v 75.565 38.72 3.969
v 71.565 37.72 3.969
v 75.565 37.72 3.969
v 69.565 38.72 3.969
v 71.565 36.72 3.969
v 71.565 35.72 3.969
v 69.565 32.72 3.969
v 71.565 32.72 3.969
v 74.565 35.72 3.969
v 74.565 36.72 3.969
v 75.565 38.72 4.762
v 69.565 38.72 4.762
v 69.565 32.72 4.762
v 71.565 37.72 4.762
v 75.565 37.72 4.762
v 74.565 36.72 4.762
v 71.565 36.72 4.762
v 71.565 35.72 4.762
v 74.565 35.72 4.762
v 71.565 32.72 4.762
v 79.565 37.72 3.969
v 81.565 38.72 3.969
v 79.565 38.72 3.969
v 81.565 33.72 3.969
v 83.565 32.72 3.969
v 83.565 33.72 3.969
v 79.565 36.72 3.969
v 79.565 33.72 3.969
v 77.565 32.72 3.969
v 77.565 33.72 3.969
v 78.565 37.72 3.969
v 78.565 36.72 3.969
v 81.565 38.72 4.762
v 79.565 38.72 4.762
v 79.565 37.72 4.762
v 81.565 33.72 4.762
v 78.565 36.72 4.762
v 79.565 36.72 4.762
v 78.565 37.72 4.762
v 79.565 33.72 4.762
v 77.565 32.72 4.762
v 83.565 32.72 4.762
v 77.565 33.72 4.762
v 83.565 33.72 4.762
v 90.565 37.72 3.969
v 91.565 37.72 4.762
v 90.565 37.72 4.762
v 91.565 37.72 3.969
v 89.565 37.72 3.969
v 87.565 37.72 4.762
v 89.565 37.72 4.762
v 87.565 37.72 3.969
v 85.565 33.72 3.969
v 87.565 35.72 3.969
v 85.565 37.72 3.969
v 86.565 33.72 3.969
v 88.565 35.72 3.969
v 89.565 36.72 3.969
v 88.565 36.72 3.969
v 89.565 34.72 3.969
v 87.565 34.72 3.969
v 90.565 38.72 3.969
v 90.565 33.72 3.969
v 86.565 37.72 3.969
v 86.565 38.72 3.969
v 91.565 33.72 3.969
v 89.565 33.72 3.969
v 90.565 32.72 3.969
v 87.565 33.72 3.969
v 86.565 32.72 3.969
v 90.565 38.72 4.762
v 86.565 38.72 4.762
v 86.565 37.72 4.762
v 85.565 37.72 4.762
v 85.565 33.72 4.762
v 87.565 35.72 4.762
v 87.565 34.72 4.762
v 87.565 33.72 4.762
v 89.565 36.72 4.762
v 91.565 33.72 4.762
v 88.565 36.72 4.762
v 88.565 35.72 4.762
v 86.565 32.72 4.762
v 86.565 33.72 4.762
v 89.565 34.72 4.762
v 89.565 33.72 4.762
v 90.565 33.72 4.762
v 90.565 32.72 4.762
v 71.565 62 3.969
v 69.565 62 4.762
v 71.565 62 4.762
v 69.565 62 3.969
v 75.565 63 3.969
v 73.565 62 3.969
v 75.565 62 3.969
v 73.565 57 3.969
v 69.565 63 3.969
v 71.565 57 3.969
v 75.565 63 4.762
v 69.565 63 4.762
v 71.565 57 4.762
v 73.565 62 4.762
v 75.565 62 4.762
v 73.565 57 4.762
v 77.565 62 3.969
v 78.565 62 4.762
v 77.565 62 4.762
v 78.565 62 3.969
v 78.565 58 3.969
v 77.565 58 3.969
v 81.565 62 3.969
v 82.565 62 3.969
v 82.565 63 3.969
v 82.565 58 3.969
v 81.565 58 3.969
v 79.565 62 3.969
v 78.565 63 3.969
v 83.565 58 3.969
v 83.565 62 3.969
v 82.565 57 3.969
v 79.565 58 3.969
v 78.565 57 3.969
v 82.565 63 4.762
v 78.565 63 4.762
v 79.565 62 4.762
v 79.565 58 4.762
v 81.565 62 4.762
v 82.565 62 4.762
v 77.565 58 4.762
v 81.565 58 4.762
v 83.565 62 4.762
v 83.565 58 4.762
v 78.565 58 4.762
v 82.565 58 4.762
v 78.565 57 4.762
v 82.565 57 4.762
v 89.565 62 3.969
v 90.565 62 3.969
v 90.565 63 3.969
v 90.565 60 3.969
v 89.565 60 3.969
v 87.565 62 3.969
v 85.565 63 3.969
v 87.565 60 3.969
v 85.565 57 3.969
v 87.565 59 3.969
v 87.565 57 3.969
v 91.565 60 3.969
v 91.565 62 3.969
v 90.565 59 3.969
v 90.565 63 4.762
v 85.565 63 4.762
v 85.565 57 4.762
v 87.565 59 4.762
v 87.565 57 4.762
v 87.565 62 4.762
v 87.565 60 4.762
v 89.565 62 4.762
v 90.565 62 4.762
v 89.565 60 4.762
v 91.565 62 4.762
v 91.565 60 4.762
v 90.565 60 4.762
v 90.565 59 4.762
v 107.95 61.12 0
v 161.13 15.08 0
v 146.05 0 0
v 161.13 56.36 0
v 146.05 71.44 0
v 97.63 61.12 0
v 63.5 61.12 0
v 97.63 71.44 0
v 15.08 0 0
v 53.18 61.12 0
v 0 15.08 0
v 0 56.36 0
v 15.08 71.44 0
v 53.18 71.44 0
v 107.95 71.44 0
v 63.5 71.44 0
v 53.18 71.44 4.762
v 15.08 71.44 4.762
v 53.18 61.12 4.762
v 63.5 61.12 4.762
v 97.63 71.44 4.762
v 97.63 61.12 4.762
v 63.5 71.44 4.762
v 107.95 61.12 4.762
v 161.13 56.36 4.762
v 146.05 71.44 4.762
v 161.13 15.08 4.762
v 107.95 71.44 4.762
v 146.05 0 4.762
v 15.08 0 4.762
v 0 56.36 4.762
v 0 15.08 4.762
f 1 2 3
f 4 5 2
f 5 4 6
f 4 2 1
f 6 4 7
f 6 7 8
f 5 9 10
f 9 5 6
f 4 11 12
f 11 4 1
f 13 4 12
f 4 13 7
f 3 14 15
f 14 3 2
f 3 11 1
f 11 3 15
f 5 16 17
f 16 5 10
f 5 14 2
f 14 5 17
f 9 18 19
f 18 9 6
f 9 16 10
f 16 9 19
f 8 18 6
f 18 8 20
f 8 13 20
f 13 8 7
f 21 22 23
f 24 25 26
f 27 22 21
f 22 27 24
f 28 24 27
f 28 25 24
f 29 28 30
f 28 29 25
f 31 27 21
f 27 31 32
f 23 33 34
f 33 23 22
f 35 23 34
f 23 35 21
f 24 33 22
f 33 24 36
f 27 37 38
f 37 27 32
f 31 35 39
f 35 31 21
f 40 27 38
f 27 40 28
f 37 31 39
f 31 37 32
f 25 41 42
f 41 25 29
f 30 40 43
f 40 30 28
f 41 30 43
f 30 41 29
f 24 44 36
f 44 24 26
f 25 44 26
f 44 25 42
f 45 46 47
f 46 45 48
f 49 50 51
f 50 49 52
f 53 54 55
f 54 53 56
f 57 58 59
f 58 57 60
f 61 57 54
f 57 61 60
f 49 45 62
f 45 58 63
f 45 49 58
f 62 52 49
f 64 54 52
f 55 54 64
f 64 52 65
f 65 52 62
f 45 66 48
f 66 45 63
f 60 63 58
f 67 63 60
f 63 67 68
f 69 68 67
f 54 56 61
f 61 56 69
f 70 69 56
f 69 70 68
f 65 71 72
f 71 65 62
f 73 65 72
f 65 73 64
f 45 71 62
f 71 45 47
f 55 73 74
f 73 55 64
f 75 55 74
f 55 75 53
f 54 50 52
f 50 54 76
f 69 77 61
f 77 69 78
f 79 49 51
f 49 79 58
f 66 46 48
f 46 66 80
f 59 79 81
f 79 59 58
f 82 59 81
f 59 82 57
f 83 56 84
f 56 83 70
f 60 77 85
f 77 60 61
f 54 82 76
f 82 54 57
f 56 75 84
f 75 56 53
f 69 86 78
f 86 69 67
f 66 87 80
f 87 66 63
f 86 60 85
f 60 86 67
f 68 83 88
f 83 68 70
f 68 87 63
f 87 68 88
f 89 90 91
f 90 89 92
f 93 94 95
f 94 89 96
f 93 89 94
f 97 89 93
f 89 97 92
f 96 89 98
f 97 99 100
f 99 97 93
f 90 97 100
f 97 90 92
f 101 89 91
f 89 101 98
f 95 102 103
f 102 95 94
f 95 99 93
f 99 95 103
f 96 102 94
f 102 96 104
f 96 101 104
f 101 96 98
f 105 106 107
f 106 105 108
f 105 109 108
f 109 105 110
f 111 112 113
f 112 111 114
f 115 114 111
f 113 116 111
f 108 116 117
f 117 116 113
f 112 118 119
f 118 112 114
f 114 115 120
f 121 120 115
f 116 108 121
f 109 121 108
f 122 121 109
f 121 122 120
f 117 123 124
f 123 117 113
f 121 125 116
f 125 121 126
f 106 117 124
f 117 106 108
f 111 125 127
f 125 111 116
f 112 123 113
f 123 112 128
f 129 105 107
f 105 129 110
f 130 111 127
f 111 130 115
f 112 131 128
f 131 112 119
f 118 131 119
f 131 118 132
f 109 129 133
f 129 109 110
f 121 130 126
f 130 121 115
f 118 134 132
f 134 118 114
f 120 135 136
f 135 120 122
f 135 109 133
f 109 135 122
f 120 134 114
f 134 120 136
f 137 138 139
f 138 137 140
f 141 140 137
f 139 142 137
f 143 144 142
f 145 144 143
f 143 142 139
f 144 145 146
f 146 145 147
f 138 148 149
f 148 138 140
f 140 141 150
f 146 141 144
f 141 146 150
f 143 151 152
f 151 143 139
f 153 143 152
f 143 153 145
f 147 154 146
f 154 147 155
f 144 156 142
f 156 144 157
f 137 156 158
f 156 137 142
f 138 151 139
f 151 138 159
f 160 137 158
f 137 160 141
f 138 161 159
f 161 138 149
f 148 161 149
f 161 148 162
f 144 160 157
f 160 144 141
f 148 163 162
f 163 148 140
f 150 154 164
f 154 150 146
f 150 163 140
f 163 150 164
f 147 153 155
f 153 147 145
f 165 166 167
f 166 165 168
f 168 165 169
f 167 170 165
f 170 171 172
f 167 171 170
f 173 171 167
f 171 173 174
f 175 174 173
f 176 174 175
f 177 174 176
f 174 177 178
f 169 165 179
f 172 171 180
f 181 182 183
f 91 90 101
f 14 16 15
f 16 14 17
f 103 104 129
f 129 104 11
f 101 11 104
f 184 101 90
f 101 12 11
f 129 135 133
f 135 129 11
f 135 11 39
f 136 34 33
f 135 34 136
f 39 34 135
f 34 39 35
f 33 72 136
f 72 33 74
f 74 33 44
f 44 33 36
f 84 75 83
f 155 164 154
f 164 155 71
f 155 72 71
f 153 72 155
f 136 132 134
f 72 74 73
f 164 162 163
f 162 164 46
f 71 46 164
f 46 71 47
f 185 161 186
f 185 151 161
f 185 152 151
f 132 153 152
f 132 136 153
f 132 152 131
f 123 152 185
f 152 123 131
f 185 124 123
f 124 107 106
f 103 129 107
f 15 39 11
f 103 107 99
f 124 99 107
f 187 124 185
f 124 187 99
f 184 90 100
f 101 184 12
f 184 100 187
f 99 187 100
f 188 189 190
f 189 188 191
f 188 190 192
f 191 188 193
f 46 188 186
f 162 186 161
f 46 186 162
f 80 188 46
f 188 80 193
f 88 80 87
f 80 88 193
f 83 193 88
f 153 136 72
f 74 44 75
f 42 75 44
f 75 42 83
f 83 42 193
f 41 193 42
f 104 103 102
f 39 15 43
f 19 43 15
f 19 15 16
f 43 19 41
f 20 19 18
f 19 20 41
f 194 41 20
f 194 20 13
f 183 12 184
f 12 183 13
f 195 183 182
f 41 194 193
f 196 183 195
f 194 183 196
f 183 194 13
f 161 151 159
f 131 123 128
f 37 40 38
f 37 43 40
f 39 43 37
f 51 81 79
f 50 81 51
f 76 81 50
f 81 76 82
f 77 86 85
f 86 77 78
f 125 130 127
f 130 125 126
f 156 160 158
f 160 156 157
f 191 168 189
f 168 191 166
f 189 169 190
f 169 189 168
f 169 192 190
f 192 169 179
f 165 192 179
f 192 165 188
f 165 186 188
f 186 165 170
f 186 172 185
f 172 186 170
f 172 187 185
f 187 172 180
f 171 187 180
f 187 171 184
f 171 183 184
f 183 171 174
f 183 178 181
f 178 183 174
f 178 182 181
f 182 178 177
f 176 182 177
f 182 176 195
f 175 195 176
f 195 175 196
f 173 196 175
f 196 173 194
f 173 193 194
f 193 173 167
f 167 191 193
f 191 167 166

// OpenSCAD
// file: text-imprint.scad
// Text imprinting for MiG-25 Model

// Copyright (C) 2014 Jeremy Bennett <jeremy@jeremybennett.com>

// Contributor: Jeremy Bennett <jeremy@jeremybennett.com>

// This file is licensed under the Creative Commons Attribution-ShareAlike 3.0
// Unported License. To view a copy of this license, visit
// http://creativecommons.org/licenses/by-sa/3.0/ or send a letter to Creative
// Commons, PO Box 1866, Mountain View, CA 94042, USA.

// 45678901234567890123456789012345678901234567890123456789012345678901234567890

use <MCAD/bitmap/bitmap.scad>

// Put the name at a location and height

// Text is along the Y axis, with the first char centered on the origin.  At
// scale 1 it has height 8mm.

// @param s   Scale factor. Default 1. Does not affect h
// @param t   Text to print
// @param tc  Number of chars to print
// @param h   Height of the piece
// @param a   Angle to rotate around Z
// @param x   x offset of text center
// @param y   y offset of text center
module text_imprint (s = 1, t, tcount, h, a, x, y) {
	translate (v = [x * s, y * s, h * 5 / 6])
		rotate (a = [0, 0, a])
			translate (v = [0, -4 * s * (tc - 1), 0])
				8bit_str (chars = t, char_count = tc, block_size = s,
				          height = h / 3);
}
// main file
// Former F10 for MiG-25 Model

// Copyright (C) 2014 Jeremy Bennett <jeremy@jeremybennett.com>

// Contributor: Jeremy Bennett <jeremy@jeremybennett.com>

// This file is licensed under the Creative Commons Attribution-ShareAlike 3.0
// Unported License. To view a copy of this license, visit
// http://creativecommons.org/licenses/by-sa/3.0/ or send a letter to Creative
// Commons, PO Box 1866, Mountain View, CA 94042, USA.

// 45678901234567890123456789012345678901234567890123456789012345678901234567890

use <MCAD/bitmap/bitmap.scad>
use <text-imprint.scad>


// The basic flat polygon

// @param s  Scale factor. Default 1
module f10_flat (s = 1) {
	polygon (points = [ [ 15.08 * s,  0.00 * s],
	                    [  0.00 * s, 15.08 * s],
	                    [  0.00 * s, 56.36 * s],
	                    [ 15.08 * s, 71.44 * s],
	                    [ 53.18 * s, 71.44 * s],
	                    [ 53.18 * s, 61.12 * s],
	                    [ 63.50 * s, 61.12 * s],,
	                    [ 63.50 * s, 71.44 * s],
	                    [ 97.63 * s, 71.44 * s],
	                    [ 97.63 * s, 61.12 * s],
	                    [107.95 * s, 61.12 * s],
	                    [107.95 * s, 71.44 * s],
	                    [146.05 * s, 71.44 * s],
	                    [161.13 * s, 56.36 * s],
	                    [161.13 * s, 15.08 * s],
	                    [146.05 * s,  0.00 * s] ]);
}


// Extrude and label the polygon

// @param h  Height of the piece.  Not affected by s
// @param s  Scale factor.  Default 1
module f10 (h, s = 1) {
	difference () {
		linear_extrude (height = h)
			f10_flat (s = s);
		text_imprint (s = s, t = ["F", "1", "0"], tc = 3, h = h, a = -90,
		              x = 161.13 / 2, y = 71.44 / 2);
		text_imprint (s = s, t = ["T", "O", "P"], tc = 3, h = h, a = -90,
		              x = 161.13/2, y = 60);
	}
}


// 3/16" thick former
f10 (h = 25.4 * 3 / 16, s = 1);
